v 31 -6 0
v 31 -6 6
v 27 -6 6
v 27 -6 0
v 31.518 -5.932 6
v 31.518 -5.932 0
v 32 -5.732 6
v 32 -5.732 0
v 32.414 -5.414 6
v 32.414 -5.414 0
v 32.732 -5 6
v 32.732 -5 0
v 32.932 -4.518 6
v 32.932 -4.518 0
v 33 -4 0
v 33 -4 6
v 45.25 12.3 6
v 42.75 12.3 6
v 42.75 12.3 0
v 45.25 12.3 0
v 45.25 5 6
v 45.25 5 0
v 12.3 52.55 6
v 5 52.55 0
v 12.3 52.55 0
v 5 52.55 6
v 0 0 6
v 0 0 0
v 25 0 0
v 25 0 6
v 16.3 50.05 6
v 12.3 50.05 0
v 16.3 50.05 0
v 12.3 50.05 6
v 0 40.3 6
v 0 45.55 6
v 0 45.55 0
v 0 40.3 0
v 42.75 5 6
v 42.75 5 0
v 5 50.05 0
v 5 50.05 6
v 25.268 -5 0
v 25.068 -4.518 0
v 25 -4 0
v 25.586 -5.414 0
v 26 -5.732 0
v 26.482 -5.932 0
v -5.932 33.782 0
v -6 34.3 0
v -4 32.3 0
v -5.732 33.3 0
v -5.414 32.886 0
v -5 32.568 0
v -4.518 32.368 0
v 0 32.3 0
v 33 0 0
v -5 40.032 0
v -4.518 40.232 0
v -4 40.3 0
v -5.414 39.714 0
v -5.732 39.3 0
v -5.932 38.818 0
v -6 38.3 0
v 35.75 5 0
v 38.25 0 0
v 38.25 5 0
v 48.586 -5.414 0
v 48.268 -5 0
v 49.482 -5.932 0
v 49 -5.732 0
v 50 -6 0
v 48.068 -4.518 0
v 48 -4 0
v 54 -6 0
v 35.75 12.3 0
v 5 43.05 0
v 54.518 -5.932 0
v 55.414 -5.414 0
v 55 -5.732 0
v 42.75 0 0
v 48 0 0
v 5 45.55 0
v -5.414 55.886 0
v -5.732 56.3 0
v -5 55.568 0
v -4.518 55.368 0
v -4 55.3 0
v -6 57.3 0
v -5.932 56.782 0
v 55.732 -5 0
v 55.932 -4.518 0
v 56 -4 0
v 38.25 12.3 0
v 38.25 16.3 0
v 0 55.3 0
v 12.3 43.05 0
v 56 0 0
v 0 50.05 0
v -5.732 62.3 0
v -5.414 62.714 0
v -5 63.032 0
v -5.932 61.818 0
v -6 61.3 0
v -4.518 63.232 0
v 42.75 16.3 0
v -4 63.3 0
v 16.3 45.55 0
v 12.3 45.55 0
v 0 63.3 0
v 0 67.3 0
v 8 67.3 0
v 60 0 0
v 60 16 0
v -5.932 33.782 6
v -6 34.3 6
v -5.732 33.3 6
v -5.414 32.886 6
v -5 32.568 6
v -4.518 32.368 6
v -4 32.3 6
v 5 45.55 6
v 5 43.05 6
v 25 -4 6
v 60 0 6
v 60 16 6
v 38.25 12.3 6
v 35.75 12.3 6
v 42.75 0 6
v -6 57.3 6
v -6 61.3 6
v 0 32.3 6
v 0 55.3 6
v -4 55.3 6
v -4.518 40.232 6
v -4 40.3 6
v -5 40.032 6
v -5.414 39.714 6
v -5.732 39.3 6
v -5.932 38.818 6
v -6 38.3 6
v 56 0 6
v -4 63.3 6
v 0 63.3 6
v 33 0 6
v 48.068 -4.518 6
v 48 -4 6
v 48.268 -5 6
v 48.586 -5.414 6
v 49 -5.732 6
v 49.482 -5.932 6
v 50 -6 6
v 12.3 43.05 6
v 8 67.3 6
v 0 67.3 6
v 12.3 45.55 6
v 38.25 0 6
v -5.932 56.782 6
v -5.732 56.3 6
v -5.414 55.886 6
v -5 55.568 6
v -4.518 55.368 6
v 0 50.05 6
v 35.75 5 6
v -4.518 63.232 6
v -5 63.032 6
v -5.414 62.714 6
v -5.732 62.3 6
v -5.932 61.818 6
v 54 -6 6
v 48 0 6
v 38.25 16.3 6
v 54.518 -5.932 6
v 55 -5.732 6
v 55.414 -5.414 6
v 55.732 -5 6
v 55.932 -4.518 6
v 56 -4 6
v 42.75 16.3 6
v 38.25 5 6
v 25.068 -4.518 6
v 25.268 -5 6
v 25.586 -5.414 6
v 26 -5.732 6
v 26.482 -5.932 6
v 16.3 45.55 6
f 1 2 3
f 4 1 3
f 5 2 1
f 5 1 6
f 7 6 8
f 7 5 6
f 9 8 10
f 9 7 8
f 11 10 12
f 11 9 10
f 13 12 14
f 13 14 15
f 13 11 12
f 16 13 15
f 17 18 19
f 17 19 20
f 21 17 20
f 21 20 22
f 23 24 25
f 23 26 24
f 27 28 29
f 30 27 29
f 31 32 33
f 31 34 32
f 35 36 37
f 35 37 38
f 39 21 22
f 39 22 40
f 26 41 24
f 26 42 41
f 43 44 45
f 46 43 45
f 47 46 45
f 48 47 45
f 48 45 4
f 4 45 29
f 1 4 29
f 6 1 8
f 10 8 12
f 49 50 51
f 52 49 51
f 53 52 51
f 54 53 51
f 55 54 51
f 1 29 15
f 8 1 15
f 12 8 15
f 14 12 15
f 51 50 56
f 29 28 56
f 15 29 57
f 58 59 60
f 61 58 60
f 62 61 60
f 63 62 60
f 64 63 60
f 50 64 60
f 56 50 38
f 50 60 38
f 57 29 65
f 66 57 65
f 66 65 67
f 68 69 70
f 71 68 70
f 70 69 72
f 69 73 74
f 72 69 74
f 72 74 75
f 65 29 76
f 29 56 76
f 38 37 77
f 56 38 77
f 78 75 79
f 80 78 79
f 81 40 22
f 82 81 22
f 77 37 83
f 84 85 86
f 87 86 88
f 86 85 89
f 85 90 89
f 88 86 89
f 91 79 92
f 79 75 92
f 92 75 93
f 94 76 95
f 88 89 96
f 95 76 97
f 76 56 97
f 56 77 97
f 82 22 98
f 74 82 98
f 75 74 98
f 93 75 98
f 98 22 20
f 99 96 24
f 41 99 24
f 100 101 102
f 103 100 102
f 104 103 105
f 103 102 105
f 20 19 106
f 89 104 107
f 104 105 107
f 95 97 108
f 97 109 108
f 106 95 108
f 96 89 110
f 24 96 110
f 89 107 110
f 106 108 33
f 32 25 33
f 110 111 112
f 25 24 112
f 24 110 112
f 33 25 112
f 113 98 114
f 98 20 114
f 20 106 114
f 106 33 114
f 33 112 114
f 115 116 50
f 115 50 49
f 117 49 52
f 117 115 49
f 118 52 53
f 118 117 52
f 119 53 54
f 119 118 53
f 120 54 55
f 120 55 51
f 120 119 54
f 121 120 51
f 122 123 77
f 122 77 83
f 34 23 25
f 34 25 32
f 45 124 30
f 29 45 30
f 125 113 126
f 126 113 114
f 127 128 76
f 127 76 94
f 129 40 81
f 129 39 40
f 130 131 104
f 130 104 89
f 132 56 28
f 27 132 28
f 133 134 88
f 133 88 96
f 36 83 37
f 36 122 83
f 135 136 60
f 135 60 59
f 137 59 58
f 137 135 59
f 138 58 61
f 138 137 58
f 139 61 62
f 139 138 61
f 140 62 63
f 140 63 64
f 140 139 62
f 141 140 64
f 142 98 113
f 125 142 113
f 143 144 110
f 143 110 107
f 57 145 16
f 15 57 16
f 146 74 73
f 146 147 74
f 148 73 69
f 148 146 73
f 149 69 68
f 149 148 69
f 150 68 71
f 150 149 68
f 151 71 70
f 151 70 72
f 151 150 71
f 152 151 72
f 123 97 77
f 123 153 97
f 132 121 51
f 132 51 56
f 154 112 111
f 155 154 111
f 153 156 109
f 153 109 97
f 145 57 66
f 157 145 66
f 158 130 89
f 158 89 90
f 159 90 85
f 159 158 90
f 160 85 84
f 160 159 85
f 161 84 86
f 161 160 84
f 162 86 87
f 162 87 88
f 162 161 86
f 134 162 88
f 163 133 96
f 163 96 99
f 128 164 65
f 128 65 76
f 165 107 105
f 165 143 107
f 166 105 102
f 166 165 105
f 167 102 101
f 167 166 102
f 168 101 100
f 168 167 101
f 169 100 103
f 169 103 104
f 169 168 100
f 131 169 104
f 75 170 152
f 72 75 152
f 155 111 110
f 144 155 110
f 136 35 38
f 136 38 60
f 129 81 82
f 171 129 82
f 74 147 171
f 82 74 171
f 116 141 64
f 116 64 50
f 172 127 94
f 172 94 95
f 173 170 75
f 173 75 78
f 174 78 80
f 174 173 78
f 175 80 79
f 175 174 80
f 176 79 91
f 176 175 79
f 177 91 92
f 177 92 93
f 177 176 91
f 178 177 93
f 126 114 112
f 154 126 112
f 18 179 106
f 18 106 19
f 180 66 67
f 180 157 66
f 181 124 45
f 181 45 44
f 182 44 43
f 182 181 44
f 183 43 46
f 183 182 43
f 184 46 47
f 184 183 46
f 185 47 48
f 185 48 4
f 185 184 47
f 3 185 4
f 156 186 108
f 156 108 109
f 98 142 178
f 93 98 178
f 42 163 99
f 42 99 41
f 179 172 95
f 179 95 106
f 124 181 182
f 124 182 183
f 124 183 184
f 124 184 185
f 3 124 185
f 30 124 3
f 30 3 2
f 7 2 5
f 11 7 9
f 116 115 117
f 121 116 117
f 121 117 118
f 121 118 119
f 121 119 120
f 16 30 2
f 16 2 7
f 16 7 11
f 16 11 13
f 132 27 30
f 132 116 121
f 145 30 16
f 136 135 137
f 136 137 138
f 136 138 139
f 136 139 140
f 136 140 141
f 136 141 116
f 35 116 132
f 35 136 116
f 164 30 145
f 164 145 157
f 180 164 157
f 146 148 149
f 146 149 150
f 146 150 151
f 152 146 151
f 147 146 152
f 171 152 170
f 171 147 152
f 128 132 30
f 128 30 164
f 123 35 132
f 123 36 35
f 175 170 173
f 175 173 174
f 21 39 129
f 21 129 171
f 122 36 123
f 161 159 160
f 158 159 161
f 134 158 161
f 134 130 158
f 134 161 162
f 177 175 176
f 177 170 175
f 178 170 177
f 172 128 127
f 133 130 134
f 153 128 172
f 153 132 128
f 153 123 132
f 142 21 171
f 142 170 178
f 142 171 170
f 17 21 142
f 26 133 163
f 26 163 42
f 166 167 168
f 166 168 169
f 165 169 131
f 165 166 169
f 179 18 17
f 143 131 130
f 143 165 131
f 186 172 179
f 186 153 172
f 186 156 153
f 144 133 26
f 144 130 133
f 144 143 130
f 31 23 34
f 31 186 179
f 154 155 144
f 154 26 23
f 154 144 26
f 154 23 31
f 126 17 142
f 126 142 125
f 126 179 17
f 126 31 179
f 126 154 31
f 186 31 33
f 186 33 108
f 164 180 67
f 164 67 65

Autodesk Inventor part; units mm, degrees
ref_plane "YZ Plane" through (0, 0, 0) normal (1, 0, 0) x (0, 1, 0)
ref_plane "XZ Plane" through (0, 0, 0) normal (0, 1, 0) x (-1, 0, 0)
ref_plane "XY Plane" through (0, 0, 0) normal (0, 0, 1) x (1, 0, 0)
sketch "Sketch1" plane through (0, 0, 0) normal (0, 0, 1) x (1, 0, 0)
  line L0 (0, 67.3) -> (0, 0)
  line L1 (0, 0) -> (60, 0)
  line L2 (60, 0) -> (60, 16)
  line L3 (60, 16) -> (8, 67.3)
  line L4 (8, 67.3) -> (0, 67.3)
  dimension "d0" = 67.3
  dimension "d1" = 8
  dimension "d2" = 16
  dimension "d3" = 60
extrude "Extrusion1" add sketch "Sketch1" along normal blind 6
sketch "Sketch2" plane through (0, 0, 6) normal (0, 0, 1) x (1, 0, 0)
  line L0 (0, 67.3) -> (0, 0) projected
  line L1 (0, 0) -> (60, 0) projected
  line L2 (60, 0) -> (60, 16) projected
  line L3 (8, 67.3) -> (0, 67.3) projected
  line L4 (16.3, 50.05) -> (16.3, 45.55)
  line L5 (0, 45.55) -> (0, 50.05)
  line L6 (5, 52.55) -> (12.3, 52.55)
  line L7 (12.3, 43.05) -> (5, 43.05)
  line L8 (38.25, 16.3) -> (42.75, 16.3)
  line L9 (42.75, 0) -> (38.25, 0)
  line L10 (45.25, 12.3) -> (45.25, 5)
  line L11 (35.75, 5) -> (35.75, 12.3)
  line L12 (5, 43.05) -> (5, 45.55)
  line L13 (5, 50.05) -> (5, 52.55)
  line L14 (12.3, 52.55) -> (12.3, 50.05)
  line L15 (12.3, 45.55) -> (12.3, 43.05)
  line L16 (0, 50.05) -> (5, 50.05)
  line L17 (12.3, 50.05) -> (16.3, 50.05)
  line L18 (16.3, 45.55) -> (12.3, 45.55)
  line L19 (5, 45.55) -> (0, 45.55)
  line L20 (35.75, 12.3) -> (38.25, 12.3)
  line L21 (42.75, 12.3) -> (45.25, 12.3)
  line L22 (45.25, 5) -> (42.75, 5)
  line L23 (38.25, 5) -> (35.75, 5)
  line L24 (38.25, 0) -> (38.25, 5)
  line L25 (38.25, 12.3) -> (38.25, 16.3)
  line L26 (42.75, 16.3) -> (42.75, 12.3)
  line L27 (42.75, 5) -> (42.75, 0)
  point P0 (16.3, 47.8)
  point P1 (40.5, 16.3)
  dimension "d6" = 4.5
  dimension "d7" = 5
  dimension "d8" = 7.3
  dimension "d9" = 4
  dimension "d10" = 2.5
  dimension "d11" = 19.5
  dimension "d12" = 19.5
extrude "Extrusion2" cut sketch "Sketch2" against normal blind 6
sketch "Sketch3" plane through (0, 0, 6) normal (0, 0, 1) x (1, 0, 0)
  line L0 (0, 45.55) -> (0, 0) projected
  line L1 (0, 0) -> (38.25, 0) projected
  line L2 (38.25, 16.3) -> (42.75, 16.3) projected
  line L3 (42.75, 0) -> (60, 0) projected
  line L4 (0, 67.3) -> (0, 50.05) projected
  line L5 (16.3, 50.05) -> (16.3, 45.55) projected
  line L6 (0, 40.3) -> (-4, 40.3)
  line L7 (-6, 38.3) -> (-6, 34.3)
  line L8 (-4, 32.3) -> (0, 32.3)
  line L9 (0, 32.3) -> (0, 40.3)
  line L10 (0, 63.3) -> (-4, 63.3)
  line L11 (-6, 61.3) -> (-6, 57.3)
  line L12 (-4, 55.3) -> (0, 55.3)
  line L13 (0, 55.3) -> (0, 63.3)
  line L14 (25, 0) -> (33, 0)
  line L15 (33, 0) -> (33, -4)
  line L16 (31, -6) -> (27, -6)
  line L17 (25, -4) -> (25, 0)
  line L18 (48, 0) -> (56, 0)
  line L19 (56, 0) -> (56, -4)
  line L20 (54, -6) -> (50, -6)
  line L21 (48, -4) -> (48, 0)
  arc A0 (-4, 63.3) -> (-6, 61.3) centre (-4, 61.3) ccw
  arc A1 (-6, 57.3) -> (-4, 55.3) centre (-4, 57.3) ccw
  arc A2 (-4, 40.3) -> (-6, 38.3) centre (-4, 38.3) ccw
  arc A3 (-6, 34.3) -> (-4, 32.3) centre (-4, 34.3) ccw
  arc A4 (25, -4) -> (27, -6) centre (27, -4) ccw
  arc A5 (31, -6) -> (33, -4) centre (31, -4) ccw
  arc A6 (48, -4) -> (50, -6) centre (50, -4) ccw
  arc A7 (54, -6) -> (56, -4) centre (54, -4) ccw
  point P0 (16.3, 47.8)
  point P1 (40.5, 16.3)
  dimension "d15" = 2
  dimension "d16" = 8
  dimension "d17" = 8
  dimension "d18" = 8
  dimension "d19" = 8
  dimension "d20" = 6
  dimension "d21" = 6
  dimension "d22" = 15
  dimension "d23" = 15
  dimension "d24" = 7.5
  dimension "d25" = 7.5
extrude "Extrusion3" add sketch "Sketch3" against normal blind 6
properties part number "y_motor_mount_brace"
